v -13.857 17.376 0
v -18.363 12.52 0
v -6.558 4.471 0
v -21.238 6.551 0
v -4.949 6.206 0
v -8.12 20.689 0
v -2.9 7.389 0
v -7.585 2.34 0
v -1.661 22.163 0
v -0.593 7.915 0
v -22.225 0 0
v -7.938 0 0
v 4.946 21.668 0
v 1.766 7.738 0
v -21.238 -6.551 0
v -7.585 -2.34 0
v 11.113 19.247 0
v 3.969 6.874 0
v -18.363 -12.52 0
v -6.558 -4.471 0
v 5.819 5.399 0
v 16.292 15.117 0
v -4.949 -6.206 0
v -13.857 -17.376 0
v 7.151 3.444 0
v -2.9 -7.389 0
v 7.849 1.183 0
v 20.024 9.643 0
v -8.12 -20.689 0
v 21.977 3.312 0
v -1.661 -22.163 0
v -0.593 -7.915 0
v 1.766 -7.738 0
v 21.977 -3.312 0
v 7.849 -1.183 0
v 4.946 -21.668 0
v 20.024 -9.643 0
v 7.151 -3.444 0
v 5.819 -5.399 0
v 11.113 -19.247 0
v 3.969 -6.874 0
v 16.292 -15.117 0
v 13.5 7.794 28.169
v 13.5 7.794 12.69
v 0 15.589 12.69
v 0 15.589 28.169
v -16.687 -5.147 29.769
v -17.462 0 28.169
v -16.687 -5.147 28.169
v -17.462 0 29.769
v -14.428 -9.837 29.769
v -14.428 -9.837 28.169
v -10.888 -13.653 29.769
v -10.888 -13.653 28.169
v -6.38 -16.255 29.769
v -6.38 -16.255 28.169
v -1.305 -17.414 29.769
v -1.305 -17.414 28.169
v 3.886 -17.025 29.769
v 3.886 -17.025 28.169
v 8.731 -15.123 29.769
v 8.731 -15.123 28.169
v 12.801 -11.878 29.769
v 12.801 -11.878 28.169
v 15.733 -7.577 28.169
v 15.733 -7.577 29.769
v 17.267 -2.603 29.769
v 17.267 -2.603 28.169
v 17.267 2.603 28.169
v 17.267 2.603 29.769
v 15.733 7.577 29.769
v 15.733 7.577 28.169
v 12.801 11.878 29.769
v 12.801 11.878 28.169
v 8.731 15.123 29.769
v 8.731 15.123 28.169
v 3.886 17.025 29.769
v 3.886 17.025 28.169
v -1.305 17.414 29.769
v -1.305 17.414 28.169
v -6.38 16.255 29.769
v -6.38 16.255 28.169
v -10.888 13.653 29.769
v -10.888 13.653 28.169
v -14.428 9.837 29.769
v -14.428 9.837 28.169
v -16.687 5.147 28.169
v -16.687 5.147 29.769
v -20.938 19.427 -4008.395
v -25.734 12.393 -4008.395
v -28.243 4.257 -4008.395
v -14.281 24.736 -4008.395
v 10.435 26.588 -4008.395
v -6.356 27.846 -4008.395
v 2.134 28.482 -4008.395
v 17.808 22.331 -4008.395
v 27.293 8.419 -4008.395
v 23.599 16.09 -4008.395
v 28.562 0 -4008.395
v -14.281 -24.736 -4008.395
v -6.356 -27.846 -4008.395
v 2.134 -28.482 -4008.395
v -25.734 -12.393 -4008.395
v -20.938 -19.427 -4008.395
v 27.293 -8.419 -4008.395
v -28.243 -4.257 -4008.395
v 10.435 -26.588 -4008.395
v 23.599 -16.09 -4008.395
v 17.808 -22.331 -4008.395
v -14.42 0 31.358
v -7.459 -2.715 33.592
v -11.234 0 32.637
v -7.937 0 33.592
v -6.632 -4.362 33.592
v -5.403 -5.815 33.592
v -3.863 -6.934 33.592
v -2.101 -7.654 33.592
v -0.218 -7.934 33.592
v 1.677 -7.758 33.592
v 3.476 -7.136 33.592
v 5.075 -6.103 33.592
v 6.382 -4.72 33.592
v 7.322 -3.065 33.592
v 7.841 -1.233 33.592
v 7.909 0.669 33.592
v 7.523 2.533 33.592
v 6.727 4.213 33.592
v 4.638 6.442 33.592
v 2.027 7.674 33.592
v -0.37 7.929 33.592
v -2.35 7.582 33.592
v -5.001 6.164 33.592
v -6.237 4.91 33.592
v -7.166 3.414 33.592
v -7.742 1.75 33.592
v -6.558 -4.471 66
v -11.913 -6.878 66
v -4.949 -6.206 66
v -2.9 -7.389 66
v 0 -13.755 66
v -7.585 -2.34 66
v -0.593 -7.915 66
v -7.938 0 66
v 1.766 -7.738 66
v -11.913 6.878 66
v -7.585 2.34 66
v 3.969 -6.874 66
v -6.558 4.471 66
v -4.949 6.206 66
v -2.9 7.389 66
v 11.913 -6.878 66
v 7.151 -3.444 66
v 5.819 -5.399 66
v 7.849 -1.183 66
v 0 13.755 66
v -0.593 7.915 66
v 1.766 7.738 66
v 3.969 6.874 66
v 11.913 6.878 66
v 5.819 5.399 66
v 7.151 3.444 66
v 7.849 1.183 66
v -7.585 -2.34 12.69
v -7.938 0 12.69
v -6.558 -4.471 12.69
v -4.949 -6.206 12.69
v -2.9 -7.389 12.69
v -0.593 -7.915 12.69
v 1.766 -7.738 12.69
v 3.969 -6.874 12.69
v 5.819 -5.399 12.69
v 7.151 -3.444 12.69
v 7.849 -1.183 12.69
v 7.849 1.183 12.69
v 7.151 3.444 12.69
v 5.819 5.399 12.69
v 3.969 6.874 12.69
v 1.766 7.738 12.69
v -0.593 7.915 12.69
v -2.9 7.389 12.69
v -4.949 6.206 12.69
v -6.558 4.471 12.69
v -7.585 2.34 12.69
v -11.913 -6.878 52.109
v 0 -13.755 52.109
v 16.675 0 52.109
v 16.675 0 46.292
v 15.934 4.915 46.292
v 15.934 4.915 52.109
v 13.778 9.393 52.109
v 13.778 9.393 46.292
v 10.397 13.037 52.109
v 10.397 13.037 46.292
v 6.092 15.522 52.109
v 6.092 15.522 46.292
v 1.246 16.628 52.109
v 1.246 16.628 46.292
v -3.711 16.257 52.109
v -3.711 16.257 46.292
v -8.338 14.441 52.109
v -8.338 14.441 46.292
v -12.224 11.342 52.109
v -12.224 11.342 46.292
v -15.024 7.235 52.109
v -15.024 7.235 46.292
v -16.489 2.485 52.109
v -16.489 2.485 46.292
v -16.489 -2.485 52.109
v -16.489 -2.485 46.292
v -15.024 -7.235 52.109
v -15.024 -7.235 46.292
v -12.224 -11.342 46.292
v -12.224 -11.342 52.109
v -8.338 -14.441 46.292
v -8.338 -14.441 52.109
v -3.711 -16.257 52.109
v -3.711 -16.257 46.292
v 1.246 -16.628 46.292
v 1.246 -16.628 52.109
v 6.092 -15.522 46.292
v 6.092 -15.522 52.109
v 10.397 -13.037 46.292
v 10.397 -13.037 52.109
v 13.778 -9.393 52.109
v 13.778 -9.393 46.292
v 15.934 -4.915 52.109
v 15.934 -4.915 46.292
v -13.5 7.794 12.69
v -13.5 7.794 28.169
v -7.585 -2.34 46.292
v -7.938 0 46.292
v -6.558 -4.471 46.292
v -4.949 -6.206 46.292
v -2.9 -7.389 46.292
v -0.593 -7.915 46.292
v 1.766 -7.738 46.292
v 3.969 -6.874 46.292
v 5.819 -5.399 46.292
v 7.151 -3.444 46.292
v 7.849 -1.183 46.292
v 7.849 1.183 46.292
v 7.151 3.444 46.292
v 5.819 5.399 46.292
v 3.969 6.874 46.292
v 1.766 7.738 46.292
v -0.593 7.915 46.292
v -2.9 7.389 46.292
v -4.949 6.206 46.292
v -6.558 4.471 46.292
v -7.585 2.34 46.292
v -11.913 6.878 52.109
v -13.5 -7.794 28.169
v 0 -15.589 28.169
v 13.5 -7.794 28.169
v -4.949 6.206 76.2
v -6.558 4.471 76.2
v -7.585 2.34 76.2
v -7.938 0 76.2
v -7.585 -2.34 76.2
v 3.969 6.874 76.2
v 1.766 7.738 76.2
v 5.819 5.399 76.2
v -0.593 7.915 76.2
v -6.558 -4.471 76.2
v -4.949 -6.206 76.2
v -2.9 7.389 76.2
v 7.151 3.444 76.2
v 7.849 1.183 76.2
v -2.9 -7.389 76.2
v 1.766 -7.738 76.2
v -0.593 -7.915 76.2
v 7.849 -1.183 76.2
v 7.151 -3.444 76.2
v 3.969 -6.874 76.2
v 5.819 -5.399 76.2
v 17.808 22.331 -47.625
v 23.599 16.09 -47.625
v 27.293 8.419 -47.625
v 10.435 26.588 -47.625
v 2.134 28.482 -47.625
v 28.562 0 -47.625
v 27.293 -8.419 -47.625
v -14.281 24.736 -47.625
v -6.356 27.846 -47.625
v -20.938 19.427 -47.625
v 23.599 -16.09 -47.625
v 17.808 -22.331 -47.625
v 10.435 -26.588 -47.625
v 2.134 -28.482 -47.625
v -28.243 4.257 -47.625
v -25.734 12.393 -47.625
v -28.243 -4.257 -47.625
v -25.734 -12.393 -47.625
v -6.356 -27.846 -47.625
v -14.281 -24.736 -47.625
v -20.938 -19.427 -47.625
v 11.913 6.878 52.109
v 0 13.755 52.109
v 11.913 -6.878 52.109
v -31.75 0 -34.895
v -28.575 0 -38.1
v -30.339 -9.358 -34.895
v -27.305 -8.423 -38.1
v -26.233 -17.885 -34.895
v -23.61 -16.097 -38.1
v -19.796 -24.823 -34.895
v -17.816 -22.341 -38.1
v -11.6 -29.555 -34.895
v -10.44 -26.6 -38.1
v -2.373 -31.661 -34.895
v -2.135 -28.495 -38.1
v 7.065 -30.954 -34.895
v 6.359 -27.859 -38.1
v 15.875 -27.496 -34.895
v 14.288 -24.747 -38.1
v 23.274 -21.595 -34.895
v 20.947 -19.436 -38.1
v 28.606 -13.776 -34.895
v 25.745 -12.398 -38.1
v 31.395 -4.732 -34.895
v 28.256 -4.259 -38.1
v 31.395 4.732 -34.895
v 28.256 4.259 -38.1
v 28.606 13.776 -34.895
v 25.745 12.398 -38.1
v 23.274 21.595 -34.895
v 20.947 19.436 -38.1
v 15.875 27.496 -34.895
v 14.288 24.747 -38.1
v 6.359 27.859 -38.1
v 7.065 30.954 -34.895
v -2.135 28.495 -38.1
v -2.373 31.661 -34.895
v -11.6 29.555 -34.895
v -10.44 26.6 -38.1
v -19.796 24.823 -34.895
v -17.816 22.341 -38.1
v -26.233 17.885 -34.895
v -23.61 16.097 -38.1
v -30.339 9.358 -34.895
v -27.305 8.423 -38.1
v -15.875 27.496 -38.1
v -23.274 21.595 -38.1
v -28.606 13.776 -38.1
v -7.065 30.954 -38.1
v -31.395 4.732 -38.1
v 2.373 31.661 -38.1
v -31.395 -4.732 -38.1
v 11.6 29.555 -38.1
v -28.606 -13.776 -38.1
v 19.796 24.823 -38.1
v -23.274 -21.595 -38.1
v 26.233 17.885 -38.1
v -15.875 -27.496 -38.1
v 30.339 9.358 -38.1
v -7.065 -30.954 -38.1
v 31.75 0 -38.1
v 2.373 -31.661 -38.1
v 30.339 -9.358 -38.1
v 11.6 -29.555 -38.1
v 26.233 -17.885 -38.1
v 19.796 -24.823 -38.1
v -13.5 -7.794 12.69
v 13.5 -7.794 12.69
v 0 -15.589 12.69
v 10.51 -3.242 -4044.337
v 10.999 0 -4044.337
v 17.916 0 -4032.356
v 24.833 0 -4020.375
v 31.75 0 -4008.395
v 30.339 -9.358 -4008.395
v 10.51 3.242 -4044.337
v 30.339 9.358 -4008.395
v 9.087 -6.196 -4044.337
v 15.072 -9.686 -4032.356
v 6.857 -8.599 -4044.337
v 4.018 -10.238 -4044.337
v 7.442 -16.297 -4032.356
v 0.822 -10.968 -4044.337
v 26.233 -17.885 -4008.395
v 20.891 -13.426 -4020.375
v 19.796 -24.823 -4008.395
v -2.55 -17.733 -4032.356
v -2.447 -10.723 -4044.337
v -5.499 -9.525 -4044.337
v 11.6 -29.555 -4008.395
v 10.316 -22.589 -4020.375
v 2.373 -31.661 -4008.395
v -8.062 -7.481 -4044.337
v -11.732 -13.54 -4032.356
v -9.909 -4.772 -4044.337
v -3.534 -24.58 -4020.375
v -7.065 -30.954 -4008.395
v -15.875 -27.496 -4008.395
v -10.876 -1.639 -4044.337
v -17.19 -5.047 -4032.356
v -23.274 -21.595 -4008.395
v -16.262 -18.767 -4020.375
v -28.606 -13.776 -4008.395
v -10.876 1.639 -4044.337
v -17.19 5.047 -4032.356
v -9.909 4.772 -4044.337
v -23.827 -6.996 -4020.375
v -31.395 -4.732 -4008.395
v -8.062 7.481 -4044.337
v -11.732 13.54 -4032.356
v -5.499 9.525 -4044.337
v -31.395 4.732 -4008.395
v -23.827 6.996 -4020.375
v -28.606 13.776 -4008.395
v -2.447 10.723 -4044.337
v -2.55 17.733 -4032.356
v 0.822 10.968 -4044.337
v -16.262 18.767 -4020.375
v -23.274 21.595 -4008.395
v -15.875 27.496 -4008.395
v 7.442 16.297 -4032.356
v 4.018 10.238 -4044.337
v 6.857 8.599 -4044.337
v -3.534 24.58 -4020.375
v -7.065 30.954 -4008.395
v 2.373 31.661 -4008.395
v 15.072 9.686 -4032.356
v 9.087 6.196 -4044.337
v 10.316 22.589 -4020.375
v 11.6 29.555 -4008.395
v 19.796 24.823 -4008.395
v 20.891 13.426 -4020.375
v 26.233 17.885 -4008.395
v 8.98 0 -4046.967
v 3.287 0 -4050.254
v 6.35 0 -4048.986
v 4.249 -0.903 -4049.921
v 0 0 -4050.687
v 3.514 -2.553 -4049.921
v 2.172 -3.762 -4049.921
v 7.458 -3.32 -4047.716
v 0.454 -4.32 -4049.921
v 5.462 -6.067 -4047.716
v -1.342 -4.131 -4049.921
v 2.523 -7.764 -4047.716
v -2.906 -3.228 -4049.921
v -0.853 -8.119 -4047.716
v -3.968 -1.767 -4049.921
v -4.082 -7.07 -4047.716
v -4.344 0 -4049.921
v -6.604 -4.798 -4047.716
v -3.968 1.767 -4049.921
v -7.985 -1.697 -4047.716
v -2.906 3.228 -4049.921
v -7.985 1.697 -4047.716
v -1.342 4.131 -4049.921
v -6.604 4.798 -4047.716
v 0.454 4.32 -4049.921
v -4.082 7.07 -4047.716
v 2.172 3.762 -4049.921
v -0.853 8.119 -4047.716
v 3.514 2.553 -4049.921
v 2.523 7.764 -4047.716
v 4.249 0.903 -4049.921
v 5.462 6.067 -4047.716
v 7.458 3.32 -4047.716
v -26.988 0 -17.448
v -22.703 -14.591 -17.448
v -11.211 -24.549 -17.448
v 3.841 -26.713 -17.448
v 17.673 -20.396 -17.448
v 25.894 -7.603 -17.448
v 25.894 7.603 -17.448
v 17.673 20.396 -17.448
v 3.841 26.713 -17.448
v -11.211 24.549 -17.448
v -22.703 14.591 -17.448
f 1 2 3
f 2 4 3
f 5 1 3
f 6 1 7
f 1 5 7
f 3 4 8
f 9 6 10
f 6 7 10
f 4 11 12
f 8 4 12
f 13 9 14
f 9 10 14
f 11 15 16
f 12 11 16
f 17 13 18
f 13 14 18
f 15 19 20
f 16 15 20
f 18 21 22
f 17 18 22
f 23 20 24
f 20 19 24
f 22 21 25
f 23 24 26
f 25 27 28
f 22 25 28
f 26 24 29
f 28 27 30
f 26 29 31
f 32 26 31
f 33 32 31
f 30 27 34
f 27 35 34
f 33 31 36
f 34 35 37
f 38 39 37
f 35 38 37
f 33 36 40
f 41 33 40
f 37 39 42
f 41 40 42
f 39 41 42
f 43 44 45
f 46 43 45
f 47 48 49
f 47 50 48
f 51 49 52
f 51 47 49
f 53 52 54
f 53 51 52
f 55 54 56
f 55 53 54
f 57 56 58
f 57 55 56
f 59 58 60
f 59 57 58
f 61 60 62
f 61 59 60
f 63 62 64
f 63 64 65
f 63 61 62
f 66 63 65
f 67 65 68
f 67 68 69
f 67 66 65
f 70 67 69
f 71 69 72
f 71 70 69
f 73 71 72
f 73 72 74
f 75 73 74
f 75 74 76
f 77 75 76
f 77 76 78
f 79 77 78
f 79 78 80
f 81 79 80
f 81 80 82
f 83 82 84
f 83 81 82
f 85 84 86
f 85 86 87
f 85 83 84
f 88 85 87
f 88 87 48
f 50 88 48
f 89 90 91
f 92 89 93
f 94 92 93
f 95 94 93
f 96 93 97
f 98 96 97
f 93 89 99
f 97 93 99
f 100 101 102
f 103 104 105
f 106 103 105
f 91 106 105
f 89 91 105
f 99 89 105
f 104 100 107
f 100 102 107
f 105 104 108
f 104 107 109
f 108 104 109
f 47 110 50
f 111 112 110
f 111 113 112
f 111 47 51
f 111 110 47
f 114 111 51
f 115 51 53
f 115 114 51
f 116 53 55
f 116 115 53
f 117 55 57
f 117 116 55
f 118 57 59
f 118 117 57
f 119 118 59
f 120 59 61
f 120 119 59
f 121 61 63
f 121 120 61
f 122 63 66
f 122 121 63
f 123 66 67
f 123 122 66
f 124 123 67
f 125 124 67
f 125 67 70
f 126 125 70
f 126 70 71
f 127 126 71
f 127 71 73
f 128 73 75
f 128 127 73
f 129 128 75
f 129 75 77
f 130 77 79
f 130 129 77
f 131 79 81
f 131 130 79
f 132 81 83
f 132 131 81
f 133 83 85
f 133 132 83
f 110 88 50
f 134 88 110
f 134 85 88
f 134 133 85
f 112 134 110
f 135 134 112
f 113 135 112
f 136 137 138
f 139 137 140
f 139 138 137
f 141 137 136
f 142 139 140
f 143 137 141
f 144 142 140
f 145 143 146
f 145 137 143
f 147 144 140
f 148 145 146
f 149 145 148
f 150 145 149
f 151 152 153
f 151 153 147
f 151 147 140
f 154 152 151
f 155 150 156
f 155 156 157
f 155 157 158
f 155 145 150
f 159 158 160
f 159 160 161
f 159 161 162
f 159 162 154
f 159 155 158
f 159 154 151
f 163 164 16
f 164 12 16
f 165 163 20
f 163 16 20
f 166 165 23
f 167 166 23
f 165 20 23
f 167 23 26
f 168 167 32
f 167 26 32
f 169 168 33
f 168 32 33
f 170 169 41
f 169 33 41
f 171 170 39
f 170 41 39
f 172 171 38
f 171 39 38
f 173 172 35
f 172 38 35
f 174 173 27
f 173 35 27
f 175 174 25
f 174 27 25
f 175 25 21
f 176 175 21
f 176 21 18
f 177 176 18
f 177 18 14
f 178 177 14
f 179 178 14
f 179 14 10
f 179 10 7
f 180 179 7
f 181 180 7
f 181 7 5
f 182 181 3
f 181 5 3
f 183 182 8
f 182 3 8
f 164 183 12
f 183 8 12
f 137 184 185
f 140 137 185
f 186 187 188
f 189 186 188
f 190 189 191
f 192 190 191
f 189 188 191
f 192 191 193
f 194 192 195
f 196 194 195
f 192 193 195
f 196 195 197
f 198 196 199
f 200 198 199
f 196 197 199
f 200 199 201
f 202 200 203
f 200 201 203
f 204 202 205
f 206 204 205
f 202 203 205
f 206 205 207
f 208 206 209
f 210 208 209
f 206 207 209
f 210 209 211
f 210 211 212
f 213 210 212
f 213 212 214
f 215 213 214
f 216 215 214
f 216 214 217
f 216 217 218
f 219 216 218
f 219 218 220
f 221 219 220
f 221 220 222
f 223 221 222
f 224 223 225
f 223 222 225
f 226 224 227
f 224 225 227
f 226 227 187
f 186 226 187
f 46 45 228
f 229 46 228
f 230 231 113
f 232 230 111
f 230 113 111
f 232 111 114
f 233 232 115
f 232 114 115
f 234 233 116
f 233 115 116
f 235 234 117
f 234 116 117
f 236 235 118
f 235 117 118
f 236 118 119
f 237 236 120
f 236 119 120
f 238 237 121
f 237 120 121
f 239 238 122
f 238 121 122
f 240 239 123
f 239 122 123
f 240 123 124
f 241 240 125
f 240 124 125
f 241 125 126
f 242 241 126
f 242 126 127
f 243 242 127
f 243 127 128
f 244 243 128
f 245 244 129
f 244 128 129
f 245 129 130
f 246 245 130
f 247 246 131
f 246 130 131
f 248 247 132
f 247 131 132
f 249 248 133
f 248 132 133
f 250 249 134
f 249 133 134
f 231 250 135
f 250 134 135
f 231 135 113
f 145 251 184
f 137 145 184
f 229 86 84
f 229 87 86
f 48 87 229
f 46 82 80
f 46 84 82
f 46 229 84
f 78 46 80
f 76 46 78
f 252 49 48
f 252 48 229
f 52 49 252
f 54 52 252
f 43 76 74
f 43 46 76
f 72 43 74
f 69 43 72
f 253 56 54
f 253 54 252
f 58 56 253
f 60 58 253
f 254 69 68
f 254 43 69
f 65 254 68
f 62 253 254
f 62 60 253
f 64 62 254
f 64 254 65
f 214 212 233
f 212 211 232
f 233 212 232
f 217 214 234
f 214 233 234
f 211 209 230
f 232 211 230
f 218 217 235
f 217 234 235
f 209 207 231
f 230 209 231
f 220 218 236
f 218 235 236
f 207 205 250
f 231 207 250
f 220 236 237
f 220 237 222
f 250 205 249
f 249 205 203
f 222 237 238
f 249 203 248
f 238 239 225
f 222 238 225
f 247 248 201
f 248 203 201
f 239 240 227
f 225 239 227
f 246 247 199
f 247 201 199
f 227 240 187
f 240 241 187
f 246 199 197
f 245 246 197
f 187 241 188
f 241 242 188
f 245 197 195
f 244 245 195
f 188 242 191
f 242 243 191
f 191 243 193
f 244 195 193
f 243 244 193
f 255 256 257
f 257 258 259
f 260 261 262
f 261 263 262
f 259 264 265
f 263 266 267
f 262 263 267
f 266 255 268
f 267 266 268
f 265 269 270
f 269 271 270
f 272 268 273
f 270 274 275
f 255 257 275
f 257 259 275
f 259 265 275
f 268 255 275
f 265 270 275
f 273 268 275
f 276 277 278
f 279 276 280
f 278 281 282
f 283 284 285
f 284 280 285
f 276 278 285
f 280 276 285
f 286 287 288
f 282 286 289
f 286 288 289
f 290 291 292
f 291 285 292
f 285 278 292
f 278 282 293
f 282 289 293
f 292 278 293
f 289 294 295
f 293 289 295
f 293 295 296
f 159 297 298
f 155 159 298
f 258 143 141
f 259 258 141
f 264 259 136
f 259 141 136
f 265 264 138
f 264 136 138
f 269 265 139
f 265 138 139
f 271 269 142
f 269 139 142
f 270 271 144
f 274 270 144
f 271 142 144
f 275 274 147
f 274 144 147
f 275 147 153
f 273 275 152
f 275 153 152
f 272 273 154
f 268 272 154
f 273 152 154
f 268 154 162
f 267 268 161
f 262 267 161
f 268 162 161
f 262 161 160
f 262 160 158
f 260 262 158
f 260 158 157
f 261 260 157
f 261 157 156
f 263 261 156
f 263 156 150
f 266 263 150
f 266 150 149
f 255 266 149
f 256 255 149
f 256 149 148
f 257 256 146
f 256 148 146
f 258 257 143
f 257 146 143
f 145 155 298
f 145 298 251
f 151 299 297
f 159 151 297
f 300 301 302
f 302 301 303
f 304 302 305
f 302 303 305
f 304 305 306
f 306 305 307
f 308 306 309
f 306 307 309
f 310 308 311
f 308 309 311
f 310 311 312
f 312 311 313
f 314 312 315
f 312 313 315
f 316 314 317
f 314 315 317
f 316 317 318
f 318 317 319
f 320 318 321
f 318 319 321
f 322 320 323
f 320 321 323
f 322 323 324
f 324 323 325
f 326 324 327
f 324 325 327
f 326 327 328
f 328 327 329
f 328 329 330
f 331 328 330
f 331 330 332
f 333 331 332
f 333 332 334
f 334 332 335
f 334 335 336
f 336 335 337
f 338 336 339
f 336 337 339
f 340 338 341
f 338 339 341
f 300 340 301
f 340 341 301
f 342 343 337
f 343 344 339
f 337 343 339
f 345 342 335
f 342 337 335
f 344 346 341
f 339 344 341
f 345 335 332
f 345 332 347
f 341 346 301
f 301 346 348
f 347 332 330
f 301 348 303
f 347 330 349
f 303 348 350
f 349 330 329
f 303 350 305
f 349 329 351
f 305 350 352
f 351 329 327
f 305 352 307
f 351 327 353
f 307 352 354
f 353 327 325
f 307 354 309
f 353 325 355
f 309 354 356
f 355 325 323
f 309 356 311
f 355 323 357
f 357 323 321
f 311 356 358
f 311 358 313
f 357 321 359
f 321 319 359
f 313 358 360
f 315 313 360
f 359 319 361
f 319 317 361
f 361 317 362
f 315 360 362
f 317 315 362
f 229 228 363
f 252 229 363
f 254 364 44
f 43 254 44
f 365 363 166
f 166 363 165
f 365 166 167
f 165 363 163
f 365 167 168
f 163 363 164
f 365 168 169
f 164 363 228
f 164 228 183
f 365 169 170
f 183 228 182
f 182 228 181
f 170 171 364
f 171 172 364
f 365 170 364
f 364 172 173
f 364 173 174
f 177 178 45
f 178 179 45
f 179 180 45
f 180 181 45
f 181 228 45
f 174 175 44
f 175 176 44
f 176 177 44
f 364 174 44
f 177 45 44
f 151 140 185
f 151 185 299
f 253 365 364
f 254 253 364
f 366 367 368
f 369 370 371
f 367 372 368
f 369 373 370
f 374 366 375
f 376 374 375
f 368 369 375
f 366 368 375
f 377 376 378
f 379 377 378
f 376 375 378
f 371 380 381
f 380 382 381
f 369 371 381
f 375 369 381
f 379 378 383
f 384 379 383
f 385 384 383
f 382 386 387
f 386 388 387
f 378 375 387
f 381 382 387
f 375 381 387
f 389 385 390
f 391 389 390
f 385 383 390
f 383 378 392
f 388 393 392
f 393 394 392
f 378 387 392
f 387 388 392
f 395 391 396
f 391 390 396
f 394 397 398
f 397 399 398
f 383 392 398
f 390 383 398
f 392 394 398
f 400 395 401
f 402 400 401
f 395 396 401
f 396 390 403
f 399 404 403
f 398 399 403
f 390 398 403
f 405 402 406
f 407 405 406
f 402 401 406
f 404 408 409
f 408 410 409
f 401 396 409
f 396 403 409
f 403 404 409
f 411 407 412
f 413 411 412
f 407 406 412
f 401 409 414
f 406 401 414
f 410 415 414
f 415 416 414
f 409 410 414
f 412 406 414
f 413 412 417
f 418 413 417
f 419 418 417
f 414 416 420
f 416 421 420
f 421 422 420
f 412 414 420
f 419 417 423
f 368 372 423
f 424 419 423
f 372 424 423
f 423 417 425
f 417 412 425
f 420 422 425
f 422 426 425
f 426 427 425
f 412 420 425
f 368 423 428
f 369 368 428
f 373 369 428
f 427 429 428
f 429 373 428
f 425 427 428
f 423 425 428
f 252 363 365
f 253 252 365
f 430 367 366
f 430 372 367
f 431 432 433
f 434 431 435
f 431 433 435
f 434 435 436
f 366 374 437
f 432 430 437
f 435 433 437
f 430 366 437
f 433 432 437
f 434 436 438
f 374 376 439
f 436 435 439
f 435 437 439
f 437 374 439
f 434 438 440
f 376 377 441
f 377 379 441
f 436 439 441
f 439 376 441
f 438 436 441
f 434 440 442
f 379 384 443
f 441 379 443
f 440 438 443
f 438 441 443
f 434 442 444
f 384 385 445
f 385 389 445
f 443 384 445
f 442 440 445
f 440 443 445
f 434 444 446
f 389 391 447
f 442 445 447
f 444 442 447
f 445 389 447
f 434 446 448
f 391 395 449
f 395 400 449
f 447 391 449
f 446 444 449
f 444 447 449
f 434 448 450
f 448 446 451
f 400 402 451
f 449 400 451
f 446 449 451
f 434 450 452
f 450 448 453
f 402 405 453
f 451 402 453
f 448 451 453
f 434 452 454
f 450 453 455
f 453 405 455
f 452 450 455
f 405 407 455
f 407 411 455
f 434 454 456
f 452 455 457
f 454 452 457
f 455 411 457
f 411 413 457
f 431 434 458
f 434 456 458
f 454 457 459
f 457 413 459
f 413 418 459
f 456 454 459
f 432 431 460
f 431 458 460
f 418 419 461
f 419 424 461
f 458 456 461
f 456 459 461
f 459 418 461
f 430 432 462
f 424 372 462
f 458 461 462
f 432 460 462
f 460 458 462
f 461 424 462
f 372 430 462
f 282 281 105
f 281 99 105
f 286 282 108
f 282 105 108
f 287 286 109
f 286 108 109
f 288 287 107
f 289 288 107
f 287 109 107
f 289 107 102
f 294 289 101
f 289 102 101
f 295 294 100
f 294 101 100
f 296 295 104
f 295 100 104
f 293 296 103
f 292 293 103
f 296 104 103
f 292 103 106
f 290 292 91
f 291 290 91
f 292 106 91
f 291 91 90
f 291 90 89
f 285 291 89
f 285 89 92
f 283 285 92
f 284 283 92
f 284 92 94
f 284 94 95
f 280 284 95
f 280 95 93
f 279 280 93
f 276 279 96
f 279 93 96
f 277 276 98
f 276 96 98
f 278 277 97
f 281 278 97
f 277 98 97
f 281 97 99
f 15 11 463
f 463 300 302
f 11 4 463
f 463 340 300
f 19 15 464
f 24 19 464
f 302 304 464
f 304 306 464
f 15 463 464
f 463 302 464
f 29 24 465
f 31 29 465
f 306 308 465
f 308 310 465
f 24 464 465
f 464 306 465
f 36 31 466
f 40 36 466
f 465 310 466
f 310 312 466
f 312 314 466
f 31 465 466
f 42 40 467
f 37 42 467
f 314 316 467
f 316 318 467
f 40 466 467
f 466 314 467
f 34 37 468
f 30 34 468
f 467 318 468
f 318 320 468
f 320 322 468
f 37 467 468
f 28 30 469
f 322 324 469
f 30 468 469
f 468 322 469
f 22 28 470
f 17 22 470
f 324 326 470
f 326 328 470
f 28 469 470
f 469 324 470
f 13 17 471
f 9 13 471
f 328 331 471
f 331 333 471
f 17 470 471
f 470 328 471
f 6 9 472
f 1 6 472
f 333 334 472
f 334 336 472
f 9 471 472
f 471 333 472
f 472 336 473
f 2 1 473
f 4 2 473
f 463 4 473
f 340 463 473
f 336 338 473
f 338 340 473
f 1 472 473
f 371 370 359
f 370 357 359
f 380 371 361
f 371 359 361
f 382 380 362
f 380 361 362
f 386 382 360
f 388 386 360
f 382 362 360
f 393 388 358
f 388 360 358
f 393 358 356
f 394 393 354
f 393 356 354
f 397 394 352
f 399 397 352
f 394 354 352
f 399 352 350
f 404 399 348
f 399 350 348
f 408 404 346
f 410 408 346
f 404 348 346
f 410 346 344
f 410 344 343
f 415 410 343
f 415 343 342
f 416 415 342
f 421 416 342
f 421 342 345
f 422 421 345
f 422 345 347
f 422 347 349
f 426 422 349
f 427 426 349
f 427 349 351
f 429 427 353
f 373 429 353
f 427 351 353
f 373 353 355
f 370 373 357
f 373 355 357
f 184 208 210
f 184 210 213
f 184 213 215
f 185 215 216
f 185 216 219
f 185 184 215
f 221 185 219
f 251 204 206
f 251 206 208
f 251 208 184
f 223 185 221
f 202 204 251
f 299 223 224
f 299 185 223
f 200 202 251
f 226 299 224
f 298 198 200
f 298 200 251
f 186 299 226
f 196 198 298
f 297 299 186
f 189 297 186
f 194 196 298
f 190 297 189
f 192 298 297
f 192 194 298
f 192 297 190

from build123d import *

# Parameters (mm, degrees)
BOSS_REVOLVE3_START         = 12.690475
BOSS_REVOLVE3_OUTLINE_R     = 7.9375
BOSS_REVOLVE3_DEPTH         = 15.478125
BOSS_REVOLVE3_START_2       = 46.292398399
BOSS_REVOLVE3_2_OUTLINE_R   = 16.6751
BOSS_REVOLVE3_2_OUTLINE_R_2 = 7.9375
BOSS_REVOLVE3_2_DEPTH       = 5.8166
BOSS_EXTRUDE2_DEPTH         = 13.890625


# Read off the part's stored shape, not the designer's step: Boss-Revolve3
with BuildPart() as part:
    # Sketch1 → Base-Revolve (revolve)
    with BuildSketch(Plane(origin=(0, 0, 0), x_dir=(0, 0, -1), z_dir=(1, 0, 0)), mode=Mode.PRIVATE) as base_revolve_sk:
        Polygon((-76.2, 0), (-76.2, 7.9375), (0, 7.9375), (0, 22.225), (34.895210283, 31.75), (38.1, 28.575), (47.625, 28.575), (47.625, 0), align=None)
    revolve(base_revolve_sk.sketch.rotate(Axis((0, 0, 0), (0, 0, 1)), 90), axis=Axis((0, 0, 0), (0, 0, 1)))

    # Sketch3 → Boss-Revolve2 (revolve)
    with BuildSketch(Plane(origin=(0, 0, 0), x_dir=(0, 0, -1), z_dir=(1, 0, 0)), mode=Mode.PRIVATE) as boss_revolve2_sk:
        with BuildLine():
            Line((-28.1686, 0), (-28.1686, 17.4625))
            Line((-28.1686, 17.4625), (-29.7688, 17.4625))
            ThreePointArc((-29.7688, 17.4625), (-33.309963658, 9.048473715), (-34.5186, 0))
            Line((-34.5186, 0), (-28.1686, 0))
        make_face()
    revolve(boss_revolve2_sk.sketch.rotate(Axis((0, 0, 0), (0, 0, 1)), 90), axis=Axis((0, 0, 0), (0, 0, 1)))

    # Sketch2 → Boss-Revolve1 (revolve)
    with BuildSketch(Plane(origin=(0, 0, 0), x_dir=(0, 0, -1), z_dir=(1, 0, 0)), mode=Mode.PRIVATE) as boss_revolve1_sk:
        with BuildLine():
            Line((38.1, 31.75), (38.1, 28.5623))
            Line((38.1, 28.5623), (4008.394586153, 28.5623))
            Line((4008.394586153, 28.5623), (4008.394586153, 0))
            Line((4008.394586153, 0), (4050.687199293, 0))
            ThreePointArc((4050.687199293, 0), (4048.985721921, 6.35), (4044.337199293, 10.998522628))
            Line((4044.337199293, 10.998522628), (4008.394586153, 31.75))
            Line((4008.394586153, 31.75), (38.1, 31.75))
        make_face()
    revolve(boss_revolve1_sk.sketch.rotate(Axis((0, 0, 29.7434), (0, 0, -1)), 90), axis=Axis((0, 0, 29.7434), (0, 0, -1)))

    # Boss-Revolve3 outline → Boss-Revolve3 (add)
    with BuildSketch(Plane.XY.offset(BOSS_REVOLVE3_START)):
        Polygon((0, -15.588572738), (13.5001, -7.794286369), (13.5001, 7.794286369), (0, 15.588572738), (-13.5001, 7.794286369), (-13.5001, -7.794286369), align=None)
        Circle(BOSS_REVOLVE3_OUTLINE_R, mode=Mode.SUBTRACT)
    extrude(amount=BOSS_REVOLVE3_DEPTH)

    # Boss-Revolve3 2 outline → Boss-Revolve3 2 (add)
    with BuildSketch(Plane.XY.offset(BOSS_REVOLVE3_START_2)):
        Circle(BOSS_REVOLVE3_2_OUTLINE_R)
        Circle(BOSS_REVOLVE3_2_OUTLINE_R_2, mode=Mode.SUBTRACT)
    extrude(amount=BOSS_REVOLVE3_2_DEPTH)

    # Sketch6 → Boss-Extrude2 (add)
    with BuildSketch(Plane.XY.offset(52.108998399)):
        Polygon((0, -13.755485633), (11.9126, -6.877742817), (11.9126, 6.877742817), (0, 13.755485633), (-11.9126, 6.877742817), (-11.9126, -6.877742817), align=None)
    extrude(amount=BOSS_EXTRUDE2_DEPTH)


solid = part.part
